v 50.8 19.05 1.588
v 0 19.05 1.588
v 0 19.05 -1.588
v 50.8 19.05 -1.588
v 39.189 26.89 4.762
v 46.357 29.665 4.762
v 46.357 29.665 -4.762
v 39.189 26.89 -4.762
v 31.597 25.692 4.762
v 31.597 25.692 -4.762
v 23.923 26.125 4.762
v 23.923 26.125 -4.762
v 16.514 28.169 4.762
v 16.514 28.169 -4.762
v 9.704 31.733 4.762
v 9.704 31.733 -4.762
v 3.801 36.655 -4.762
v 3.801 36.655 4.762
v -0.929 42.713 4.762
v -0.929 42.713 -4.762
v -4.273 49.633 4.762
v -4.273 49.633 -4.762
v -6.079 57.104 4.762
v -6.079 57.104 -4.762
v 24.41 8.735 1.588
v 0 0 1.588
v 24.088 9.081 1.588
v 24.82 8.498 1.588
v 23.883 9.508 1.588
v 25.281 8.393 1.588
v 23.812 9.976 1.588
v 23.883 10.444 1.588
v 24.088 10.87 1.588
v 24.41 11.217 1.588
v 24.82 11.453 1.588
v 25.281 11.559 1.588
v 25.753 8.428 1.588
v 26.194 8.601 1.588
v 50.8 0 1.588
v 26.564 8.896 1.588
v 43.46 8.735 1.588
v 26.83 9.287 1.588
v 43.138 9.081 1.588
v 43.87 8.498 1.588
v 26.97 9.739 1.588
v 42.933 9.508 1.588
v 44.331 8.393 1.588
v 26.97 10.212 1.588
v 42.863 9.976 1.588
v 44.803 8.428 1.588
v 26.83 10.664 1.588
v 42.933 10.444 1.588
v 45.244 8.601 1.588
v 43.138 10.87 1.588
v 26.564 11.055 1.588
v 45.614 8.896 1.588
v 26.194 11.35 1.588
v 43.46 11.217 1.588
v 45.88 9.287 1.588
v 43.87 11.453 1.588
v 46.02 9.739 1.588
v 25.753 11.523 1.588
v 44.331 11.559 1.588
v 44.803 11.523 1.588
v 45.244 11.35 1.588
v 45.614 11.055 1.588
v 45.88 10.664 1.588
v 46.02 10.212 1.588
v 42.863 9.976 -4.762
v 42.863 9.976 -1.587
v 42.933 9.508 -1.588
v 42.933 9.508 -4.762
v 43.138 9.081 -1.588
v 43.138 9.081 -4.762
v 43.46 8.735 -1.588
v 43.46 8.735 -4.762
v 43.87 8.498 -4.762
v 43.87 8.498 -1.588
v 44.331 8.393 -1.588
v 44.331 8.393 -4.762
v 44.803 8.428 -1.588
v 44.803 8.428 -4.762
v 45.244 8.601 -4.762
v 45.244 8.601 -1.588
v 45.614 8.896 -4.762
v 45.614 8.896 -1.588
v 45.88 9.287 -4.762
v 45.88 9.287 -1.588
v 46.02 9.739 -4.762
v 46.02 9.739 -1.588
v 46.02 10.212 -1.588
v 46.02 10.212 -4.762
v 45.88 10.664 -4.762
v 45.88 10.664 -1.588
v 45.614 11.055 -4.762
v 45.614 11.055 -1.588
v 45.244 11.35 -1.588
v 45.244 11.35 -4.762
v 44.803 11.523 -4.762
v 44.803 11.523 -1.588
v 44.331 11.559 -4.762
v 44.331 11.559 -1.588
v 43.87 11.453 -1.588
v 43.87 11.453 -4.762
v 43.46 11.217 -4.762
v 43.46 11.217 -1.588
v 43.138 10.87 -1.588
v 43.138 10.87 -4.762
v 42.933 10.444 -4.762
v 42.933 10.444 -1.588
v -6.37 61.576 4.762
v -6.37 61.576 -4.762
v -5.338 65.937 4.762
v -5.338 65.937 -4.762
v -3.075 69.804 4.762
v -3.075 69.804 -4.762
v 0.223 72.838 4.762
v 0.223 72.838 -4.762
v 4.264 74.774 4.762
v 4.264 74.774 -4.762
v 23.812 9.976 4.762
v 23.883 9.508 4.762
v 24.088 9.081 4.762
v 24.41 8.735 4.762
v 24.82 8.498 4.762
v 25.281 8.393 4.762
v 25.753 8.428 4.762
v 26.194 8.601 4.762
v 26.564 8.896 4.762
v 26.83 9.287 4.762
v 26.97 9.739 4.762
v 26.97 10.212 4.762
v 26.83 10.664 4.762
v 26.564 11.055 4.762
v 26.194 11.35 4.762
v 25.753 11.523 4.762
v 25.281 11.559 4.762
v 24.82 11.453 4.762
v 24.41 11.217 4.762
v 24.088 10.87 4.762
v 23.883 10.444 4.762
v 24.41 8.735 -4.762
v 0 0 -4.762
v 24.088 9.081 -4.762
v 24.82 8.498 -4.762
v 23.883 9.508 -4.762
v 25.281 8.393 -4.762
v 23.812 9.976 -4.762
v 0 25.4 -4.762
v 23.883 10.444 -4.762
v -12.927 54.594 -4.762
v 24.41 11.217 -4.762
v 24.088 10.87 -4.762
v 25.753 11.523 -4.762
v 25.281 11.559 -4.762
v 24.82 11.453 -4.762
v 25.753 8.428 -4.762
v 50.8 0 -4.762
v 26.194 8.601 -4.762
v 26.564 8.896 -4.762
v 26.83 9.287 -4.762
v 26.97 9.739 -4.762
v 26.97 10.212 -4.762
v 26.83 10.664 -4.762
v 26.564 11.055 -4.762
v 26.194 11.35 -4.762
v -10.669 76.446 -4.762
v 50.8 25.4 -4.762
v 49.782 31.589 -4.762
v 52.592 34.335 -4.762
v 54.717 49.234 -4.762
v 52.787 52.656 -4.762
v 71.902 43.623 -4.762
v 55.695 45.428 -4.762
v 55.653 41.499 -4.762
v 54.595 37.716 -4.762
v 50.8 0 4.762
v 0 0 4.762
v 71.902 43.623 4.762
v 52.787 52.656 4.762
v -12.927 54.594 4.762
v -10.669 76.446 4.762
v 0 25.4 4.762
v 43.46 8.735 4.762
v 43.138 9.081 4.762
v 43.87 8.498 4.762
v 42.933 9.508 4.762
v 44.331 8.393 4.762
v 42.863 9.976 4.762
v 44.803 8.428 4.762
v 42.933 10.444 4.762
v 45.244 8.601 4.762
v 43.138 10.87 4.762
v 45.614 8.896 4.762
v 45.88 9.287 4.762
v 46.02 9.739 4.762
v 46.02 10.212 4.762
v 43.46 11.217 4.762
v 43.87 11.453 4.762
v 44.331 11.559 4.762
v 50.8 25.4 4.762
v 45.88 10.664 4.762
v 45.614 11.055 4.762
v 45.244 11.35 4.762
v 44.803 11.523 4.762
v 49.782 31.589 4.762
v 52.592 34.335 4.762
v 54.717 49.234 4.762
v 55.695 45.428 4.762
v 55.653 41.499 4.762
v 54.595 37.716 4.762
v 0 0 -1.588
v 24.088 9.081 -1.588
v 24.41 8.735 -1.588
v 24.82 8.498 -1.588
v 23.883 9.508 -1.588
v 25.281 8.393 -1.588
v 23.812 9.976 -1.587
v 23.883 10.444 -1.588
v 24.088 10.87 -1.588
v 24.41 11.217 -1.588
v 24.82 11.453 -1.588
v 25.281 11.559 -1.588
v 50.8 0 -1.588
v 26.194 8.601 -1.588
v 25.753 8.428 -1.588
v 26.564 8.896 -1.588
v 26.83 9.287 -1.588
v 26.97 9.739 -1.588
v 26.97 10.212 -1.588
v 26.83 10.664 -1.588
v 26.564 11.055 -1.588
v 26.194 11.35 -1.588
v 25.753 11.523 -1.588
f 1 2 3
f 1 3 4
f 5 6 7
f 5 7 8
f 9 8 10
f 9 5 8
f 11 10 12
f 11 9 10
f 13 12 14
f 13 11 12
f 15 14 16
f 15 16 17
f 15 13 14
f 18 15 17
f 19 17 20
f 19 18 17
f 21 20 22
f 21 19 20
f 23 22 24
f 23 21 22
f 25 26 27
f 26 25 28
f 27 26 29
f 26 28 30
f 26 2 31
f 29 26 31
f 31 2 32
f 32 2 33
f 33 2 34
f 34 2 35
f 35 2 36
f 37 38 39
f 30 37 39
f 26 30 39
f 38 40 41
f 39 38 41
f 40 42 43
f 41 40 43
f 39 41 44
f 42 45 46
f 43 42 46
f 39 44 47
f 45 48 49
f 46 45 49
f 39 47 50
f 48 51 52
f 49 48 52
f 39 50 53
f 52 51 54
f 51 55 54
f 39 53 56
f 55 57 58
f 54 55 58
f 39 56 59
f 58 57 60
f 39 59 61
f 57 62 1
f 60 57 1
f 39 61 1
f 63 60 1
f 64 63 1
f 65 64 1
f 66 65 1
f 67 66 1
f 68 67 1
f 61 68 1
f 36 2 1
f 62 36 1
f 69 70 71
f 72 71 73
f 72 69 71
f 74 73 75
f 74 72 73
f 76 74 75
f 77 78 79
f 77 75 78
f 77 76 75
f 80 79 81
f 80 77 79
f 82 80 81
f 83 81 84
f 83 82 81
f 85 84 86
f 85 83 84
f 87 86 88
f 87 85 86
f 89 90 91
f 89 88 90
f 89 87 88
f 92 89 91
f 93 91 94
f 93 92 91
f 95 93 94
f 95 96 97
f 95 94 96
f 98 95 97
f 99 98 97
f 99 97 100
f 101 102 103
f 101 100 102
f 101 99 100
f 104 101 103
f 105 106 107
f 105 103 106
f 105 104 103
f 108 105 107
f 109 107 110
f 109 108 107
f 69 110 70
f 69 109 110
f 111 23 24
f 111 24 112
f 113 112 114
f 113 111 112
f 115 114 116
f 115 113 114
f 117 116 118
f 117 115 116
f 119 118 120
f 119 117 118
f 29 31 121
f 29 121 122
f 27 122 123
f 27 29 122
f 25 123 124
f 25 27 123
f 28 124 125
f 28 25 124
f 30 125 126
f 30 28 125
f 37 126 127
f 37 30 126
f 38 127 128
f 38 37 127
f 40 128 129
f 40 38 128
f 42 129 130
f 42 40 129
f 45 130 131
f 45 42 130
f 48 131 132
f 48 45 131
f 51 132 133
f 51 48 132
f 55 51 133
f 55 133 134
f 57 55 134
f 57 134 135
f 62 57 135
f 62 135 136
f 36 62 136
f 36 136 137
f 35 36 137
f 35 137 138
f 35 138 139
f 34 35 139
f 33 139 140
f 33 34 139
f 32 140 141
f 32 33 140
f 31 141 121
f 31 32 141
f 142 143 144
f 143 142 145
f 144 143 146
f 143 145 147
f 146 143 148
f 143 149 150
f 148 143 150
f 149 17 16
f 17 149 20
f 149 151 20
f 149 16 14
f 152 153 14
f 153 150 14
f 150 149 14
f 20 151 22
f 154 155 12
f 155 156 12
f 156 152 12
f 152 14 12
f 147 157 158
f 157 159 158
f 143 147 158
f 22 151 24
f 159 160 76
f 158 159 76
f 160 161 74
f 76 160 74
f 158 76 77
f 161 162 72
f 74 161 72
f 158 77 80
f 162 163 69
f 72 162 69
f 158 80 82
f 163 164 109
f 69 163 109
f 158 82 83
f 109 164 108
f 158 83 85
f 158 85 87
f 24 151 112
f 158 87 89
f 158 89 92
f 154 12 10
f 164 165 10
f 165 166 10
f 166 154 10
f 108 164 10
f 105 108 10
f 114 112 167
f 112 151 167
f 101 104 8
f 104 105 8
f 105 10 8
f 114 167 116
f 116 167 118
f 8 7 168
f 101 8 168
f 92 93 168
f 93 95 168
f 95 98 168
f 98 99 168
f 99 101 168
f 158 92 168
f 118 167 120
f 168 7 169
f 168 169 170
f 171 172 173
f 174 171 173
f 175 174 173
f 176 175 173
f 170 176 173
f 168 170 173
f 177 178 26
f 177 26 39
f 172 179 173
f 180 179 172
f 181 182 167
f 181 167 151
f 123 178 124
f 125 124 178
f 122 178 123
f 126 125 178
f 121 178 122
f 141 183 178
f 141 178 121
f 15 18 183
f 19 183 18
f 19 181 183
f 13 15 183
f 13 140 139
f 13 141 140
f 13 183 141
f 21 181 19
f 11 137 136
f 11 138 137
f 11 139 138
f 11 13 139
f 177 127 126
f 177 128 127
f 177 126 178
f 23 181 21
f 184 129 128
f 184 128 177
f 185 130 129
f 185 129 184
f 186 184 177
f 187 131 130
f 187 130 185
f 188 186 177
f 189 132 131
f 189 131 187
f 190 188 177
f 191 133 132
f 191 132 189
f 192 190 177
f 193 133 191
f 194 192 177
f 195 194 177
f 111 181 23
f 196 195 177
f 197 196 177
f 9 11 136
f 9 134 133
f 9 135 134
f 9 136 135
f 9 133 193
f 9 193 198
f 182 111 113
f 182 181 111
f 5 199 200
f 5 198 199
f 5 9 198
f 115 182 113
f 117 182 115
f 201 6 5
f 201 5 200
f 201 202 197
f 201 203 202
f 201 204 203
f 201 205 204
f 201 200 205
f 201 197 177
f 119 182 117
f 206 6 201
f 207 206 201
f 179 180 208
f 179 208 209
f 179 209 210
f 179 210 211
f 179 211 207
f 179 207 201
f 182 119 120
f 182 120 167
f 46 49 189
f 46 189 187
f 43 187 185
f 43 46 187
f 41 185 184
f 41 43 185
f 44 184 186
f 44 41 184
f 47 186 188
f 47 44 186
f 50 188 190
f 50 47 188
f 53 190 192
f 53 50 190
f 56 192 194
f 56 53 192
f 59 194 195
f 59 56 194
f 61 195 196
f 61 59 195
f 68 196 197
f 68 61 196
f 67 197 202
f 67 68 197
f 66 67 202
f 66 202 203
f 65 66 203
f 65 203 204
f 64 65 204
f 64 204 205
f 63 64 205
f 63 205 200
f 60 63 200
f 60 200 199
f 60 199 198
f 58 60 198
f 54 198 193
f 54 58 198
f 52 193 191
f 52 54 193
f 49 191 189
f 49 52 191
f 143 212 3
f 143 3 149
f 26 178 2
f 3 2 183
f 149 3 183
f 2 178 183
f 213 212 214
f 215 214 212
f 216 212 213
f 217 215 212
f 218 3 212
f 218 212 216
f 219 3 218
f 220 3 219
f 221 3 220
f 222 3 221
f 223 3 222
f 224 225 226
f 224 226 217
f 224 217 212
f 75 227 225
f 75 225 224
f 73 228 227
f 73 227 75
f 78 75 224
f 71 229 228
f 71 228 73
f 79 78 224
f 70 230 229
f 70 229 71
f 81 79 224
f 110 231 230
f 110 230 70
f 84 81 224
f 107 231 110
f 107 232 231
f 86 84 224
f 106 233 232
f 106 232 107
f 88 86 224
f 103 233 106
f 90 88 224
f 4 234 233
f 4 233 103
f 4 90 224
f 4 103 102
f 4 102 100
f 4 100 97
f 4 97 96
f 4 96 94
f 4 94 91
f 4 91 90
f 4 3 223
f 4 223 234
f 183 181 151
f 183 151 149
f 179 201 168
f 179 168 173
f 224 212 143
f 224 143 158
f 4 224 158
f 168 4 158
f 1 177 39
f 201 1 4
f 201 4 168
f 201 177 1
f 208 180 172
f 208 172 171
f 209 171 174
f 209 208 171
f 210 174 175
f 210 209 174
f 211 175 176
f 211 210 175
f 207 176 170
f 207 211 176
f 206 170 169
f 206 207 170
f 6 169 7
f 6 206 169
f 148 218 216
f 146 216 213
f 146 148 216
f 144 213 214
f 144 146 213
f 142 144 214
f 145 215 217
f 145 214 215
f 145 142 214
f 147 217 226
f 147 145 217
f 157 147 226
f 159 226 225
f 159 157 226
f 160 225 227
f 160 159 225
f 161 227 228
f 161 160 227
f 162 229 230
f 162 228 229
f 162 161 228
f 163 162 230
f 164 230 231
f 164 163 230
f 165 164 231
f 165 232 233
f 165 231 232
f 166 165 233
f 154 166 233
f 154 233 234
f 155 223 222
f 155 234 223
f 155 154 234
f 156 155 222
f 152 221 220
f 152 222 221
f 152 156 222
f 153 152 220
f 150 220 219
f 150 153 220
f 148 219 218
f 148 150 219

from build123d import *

# Parameters (mm, degrees)
SKETCH7_W           = 50.8
SKETCH7_H           = 19.05
SKETCH7_R           = 1.5875
BOSS_EXTRUDE1_DEPTH = 4.7625
SKETCH7_6_W         = 50.8
SKETCH7_6_H         = 19.05
CUT_EXTRUDE1_DEPTH  = 1.5875
SKETCH13_W          = 50.8
SKETCH13_H          = 6.35
BOSS_EXTRUDE4_DEPTH = 9.525
BOSS_EXTRUDE5_DEPTH = 9.525


with BuildPart() as part:
    # Sketch7 → Boss-Extrude1 (new, symmetric)
    with BuildSketch(Plane.XY):
        with Locations((25.4, 9.525)):
            Rectangle(SKETCH7_W, SKETCH7_H)
        with Locations((25.4, 9.975665903)):
            Circle(SKETCH7_R, mode=Mode.SUBTRACT)
        with Locations((44.45, 9.975665903)):
            Circle(SKETCH7_R, mode=Mode.SUBTRACT)
    extrude(amount=BOSS_EXTRUDE1_DEPTH, both=True)

    # Sketch7<6> → Cut-Extrude1 (cut, symmetric)
    with BuildSketch(Plane.XY):
        with Locations((25.4, 9.525)):
            Rectangle(SKETCH7_6_W, SKETCH7_6_H)
    extrude(amount=CUT_EXTRUDE1_DEPTH, both=True, mode=Mode.SUBTRACT)


with BuildPart() as cut_extrude1_piece_1:
    # of the separate pieces the step leaves, piece 1, a body of its own (cut_extrude1_pieces)
    add(part.part.solids().sort_by_distance((0, 0, 4.7625))[0])



with BuildPart() as cut_extrude1_piece_2:
    # of the separate pieces the step leaves, piece 2, a body of its own (cut_extrude1_pieces)
    add(part.part.solids().sort_by_distance((0, 0, -1.5875))[0])


with BuildPart() as cut_extrude1_piece_1_1:
    add(cut_extrude1_piece_1.part)

    add(cut_extrude1_piece_2.part)  # Boss-Extrude4 merges Cut-Extrude1 piece 2
    # Sketch13 → Boss-Extrude4 (add)
    with BuildSketch(Plane.XY.offset(4.7625)):
        with Locations((25.4, 22.225)):
            Rectangle(SKETCH13_W, SKETCH13_H)
    extrude(amount=-BOSS_EXTRUDE4_DEPTH)

    # Sketch14 → Boss-Extrude5 (add)
    with BuildSketch(Plane.XY.offset(4.7625)):
        with BuildLine():
            Line((50.8, 25.4), (71.902482506, 43.622575132))
            Line((71.902482506, 43.622575132), (52.787315523, 52.655864431))
            ThreePointArc((52.787315523, 52.655864431), (55.247905821, 39.572849469), (46.356867644, 29.664811055))
            ThreePointArc((46.356867644, 29.664811055), (13.014341519, 29.769386724), (-6.078550984, 57.104280913))
            ThreePointArc((-6.078550984, 57.104280913), (-4.350402215, 67.954625431), (4.26443102, 74.773798595))
            Line((4.26443102, 74.773798595), (-10.669308695, 76.446075822))
            Line((-10.669308695, 76.446075822), (-12.926576502, 54.593807627))
            Line((-12.926576502, 54.593807627), (0, 25.4))
            Line((0, 25.4), (50.8, 25.4))
        make_face()
    extrude(amount=-BOSS_EXTRUDE5_DEPTH)


solid = cut_extrude1_piece_1_1.part
